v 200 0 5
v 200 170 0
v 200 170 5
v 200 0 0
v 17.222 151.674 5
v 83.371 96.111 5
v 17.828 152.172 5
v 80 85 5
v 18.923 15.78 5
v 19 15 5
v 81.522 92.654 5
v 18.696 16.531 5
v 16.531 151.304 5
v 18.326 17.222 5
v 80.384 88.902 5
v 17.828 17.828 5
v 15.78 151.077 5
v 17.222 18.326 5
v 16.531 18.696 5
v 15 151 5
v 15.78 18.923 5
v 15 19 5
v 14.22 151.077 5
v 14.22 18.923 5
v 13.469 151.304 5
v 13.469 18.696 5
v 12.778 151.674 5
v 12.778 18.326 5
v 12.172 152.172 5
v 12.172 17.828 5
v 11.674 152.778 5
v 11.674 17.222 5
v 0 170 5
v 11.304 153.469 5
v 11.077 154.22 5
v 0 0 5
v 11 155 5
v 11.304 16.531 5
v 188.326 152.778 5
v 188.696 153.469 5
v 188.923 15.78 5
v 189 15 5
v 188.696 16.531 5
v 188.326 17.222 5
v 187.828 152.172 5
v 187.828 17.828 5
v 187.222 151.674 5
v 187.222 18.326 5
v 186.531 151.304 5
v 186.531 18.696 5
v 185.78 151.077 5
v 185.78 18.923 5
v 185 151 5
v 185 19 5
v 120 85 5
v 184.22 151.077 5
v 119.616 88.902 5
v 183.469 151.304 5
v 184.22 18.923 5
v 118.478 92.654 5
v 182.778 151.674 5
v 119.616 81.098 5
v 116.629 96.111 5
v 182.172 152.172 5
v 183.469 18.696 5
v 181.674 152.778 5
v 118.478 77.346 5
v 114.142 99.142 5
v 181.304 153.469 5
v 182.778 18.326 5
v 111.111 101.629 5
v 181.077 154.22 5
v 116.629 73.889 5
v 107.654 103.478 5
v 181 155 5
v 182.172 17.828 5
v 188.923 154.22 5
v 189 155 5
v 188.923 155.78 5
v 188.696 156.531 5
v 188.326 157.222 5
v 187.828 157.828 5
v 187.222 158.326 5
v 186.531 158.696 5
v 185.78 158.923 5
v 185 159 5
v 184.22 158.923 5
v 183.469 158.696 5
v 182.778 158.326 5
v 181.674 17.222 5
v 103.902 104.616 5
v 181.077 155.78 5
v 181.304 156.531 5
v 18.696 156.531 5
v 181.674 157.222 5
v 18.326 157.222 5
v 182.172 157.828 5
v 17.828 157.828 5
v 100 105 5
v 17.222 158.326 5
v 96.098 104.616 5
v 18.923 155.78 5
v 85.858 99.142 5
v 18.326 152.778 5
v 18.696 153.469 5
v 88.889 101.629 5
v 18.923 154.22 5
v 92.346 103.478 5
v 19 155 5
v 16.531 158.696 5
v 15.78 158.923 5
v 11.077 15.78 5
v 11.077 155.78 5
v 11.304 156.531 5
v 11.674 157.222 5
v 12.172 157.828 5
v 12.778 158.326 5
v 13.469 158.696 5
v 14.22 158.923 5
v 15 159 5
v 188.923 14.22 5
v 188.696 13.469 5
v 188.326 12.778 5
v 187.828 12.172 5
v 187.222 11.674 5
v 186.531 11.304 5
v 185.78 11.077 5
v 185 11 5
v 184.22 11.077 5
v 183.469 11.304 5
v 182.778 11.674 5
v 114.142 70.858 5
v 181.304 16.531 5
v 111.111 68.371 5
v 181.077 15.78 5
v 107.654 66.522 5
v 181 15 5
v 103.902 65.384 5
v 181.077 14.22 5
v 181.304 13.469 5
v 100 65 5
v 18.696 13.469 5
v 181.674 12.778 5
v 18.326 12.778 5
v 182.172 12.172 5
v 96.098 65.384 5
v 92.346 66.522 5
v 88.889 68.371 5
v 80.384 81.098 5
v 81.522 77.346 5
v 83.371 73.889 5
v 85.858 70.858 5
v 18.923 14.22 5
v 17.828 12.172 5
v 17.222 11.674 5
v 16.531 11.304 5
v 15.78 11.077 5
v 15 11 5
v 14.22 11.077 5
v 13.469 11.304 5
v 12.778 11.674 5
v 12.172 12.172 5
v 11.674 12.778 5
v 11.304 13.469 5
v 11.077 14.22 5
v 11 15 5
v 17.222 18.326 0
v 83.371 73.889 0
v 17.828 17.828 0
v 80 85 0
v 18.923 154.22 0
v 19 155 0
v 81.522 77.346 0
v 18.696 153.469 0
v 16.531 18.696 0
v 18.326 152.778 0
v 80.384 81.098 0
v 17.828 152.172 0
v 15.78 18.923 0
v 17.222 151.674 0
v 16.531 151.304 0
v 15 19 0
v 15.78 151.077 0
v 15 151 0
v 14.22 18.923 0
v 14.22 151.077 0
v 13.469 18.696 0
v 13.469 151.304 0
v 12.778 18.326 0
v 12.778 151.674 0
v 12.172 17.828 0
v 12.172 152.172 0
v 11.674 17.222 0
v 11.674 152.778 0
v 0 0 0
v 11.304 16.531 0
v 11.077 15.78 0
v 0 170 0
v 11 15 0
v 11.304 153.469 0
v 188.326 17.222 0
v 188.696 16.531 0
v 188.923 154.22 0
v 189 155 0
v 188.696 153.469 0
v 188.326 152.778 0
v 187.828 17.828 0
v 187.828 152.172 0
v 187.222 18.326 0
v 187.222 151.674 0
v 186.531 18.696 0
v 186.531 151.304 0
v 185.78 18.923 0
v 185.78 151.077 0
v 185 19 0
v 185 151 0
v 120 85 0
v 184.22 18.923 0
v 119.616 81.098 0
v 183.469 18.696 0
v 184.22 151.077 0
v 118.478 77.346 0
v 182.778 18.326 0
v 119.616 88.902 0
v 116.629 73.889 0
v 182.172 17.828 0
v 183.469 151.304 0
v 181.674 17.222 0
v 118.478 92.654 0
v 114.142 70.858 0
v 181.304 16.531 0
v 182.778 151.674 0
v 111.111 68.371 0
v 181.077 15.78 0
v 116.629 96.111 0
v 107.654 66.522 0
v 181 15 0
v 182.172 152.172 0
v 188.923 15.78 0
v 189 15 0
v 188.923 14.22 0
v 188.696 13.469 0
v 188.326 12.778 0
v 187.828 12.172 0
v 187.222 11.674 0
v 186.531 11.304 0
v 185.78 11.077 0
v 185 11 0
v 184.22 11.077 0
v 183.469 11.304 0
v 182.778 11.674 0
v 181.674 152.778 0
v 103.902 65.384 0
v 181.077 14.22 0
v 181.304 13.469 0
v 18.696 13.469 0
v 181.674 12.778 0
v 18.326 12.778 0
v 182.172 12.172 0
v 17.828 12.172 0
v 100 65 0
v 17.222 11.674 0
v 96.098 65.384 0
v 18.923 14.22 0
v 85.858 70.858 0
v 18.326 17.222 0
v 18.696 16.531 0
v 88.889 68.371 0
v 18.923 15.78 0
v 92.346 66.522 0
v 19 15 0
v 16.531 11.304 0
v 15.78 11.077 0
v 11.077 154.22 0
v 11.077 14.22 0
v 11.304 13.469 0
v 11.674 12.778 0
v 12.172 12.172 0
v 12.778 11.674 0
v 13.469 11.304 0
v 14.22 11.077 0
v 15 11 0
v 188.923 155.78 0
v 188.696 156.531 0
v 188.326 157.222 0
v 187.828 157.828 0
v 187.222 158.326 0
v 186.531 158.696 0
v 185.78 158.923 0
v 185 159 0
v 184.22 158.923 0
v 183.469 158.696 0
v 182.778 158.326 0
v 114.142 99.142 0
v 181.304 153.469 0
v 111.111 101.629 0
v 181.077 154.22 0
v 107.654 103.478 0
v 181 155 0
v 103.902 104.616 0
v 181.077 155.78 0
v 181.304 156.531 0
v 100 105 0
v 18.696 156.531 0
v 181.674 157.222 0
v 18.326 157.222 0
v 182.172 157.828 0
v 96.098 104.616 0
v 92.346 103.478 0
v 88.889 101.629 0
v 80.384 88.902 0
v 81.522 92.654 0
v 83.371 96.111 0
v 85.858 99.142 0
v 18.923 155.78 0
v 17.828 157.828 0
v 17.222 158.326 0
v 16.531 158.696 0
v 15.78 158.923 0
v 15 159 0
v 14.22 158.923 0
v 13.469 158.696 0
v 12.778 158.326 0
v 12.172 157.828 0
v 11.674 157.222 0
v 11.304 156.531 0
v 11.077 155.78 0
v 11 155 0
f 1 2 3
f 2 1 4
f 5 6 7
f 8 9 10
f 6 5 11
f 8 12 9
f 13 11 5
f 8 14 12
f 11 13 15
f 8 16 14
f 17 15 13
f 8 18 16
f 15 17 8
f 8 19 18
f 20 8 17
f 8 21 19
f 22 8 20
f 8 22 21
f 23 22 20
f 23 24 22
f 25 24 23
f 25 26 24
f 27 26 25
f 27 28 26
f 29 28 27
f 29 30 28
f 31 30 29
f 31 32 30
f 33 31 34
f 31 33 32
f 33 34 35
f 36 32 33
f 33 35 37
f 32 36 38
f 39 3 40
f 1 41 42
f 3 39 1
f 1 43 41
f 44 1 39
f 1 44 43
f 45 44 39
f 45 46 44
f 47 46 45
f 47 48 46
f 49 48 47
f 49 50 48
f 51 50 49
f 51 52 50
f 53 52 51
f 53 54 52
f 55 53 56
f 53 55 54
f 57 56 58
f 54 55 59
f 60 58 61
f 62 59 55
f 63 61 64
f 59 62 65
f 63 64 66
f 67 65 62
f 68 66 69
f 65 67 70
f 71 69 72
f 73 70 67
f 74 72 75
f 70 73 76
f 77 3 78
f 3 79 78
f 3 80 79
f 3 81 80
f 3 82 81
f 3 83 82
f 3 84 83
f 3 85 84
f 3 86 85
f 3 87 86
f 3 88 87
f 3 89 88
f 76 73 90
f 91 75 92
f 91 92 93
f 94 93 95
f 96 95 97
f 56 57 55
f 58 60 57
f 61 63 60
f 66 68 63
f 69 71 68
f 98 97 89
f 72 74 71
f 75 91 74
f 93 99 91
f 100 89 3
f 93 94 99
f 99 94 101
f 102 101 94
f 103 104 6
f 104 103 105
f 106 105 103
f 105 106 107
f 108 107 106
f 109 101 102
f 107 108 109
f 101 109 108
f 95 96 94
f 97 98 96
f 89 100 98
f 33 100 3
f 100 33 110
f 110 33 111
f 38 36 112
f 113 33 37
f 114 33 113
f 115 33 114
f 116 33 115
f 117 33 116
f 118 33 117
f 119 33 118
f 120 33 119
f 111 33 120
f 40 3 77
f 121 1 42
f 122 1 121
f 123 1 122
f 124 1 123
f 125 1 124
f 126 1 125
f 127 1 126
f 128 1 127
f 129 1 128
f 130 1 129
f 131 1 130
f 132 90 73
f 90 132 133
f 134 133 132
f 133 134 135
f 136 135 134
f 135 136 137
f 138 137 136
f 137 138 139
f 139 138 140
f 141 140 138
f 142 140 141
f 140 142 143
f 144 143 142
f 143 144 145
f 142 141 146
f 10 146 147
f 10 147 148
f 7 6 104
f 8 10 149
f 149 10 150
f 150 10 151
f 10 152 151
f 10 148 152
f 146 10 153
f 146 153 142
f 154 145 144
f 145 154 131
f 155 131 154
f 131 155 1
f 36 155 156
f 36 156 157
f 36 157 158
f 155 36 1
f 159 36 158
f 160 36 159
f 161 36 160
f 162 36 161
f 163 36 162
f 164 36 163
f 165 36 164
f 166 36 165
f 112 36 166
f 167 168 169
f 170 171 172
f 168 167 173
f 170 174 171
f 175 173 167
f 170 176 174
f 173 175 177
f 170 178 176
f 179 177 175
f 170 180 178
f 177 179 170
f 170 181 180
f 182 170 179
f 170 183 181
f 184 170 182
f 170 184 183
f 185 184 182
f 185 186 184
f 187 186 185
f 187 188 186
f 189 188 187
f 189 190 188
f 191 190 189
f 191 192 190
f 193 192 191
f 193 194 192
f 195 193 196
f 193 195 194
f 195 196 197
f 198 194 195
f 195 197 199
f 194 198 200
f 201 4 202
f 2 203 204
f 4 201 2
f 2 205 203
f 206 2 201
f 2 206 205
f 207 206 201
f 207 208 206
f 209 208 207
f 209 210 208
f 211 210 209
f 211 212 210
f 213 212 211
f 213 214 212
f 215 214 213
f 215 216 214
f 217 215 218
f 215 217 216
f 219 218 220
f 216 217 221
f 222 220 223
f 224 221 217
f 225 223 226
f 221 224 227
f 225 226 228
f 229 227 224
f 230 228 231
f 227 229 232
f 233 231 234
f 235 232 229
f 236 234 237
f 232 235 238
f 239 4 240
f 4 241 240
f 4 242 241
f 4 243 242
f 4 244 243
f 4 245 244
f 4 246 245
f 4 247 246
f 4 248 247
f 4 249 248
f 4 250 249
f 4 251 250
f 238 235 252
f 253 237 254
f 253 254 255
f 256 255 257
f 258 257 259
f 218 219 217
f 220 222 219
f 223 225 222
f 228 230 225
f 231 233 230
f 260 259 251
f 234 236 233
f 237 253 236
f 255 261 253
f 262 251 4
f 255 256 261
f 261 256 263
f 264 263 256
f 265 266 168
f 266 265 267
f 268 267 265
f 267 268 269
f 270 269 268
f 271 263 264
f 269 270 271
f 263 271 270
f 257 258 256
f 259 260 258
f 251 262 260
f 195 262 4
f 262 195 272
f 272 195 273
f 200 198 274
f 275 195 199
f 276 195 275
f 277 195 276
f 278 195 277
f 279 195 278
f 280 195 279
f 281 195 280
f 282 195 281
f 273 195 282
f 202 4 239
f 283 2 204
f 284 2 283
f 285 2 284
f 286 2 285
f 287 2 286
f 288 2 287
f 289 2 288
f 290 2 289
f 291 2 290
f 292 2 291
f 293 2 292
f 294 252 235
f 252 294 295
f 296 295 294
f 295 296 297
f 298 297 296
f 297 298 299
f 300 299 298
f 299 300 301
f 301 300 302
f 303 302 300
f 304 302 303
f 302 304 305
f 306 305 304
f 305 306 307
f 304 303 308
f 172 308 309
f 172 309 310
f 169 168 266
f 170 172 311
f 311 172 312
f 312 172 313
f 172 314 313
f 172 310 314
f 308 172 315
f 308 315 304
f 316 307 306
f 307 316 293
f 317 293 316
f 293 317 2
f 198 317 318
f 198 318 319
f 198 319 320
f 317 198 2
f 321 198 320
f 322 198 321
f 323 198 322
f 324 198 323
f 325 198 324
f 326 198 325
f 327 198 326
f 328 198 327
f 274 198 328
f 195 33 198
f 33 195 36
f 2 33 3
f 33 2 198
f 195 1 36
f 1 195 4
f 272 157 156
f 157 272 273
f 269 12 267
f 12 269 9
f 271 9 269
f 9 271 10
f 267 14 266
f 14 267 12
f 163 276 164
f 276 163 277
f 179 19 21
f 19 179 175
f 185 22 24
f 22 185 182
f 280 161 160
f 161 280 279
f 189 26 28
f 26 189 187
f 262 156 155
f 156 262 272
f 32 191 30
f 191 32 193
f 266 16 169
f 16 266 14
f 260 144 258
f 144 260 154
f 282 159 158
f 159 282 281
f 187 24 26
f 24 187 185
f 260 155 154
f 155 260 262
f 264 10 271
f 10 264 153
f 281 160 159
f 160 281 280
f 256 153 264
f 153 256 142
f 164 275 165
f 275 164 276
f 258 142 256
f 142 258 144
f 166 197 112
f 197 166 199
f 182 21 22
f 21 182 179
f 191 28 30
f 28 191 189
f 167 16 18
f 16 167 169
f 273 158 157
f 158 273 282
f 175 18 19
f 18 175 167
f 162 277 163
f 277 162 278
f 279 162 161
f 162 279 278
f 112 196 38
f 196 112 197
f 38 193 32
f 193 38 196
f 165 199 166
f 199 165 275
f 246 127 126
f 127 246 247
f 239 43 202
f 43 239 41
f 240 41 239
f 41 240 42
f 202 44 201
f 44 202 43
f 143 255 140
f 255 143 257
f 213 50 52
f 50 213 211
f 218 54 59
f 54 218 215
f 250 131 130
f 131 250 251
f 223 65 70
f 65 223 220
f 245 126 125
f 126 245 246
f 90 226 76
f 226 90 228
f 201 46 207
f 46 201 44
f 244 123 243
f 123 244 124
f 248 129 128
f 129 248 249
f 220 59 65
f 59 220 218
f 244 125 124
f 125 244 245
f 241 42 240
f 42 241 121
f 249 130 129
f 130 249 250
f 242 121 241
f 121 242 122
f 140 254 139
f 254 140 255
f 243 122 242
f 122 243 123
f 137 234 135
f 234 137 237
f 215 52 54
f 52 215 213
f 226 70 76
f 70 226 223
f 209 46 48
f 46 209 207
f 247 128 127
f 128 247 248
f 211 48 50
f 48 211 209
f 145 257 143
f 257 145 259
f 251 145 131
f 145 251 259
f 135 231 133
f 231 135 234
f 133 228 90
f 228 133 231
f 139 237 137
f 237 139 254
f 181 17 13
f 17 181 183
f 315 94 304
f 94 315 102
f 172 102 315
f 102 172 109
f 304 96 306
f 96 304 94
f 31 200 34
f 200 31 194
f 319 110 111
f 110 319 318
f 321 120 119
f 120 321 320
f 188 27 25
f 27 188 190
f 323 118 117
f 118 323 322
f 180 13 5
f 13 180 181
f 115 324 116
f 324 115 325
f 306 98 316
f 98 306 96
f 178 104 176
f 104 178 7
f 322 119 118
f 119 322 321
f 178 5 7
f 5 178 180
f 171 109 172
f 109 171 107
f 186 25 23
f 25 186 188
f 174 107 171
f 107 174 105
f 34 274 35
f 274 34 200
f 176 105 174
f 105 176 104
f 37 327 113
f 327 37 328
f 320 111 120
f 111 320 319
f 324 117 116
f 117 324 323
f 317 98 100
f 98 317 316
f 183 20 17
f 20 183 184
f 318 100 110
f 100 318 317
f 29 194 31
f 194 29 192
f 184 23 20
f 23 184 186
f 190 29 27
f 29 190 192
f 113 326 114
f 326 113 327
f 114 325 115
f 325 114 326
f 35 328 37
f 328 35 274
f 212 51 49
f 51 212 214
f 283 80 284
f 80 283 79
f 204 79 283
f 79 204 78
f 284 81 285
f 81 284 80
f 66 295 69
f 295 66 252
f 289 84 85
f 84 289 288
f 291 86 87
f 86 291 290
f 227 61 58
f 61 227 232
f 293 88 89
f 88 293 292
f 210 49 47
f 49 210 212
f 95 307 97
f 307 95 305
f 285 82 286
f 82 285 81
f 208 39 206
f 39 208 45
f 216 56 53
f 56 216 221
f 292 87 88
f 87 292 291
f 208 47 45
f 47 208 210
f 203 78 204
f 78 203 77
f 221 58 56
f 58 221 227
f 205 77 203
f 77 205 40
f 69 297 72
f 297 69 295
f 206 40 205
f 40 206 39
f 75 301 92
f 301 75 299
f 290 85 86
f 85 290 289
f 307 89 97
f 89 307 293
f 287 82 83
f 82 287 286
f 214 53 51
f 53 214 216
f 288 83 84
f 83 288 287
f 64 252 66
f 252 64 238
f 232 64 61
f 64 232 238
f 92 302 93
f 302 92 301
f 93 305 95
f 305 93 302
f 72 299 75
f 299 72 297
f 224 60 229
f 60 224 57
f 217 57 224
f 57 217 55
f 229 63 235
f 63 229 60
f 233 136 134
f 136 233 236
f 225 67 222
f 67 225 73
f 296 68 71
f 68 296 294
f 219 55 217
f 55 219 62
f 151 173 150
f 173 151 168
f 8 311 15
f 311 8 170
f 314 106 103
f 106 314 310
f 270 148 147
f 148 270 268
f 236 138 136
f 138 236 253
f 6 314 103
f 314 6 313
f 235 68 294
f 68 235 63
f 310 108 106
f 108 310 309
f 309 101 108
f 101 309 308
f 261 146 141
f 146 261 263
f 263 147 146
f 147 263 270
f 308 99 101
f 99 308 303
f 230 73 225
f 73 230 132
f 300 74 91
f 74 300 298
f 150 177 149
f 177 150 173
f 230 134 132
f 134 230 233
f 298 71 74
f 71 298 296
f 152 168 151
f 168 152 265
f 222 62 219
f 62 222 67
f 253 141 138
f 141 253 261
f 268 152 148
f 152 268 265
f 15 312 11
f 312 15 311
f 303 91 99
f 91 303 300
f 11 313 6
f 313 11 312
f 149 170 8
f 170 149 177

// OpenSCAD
$fn = 32;

// ----------------------------------------------------------------------
// Big plate: 200-250 mm adapter plate
// ----------------------------------------------------------------------

// --- parameters (mm) ---
plate_l = 200;            // plate length, X
plate_w = 170;            // plate width, Y
plate_t = 5;              // plate thickness, Z
corner_d = 8;             // corner hole diameter
corner_in = 15;           // corner hole inset from the edges
bore_d = 40;              // central bore

difference() {
  cube([plate_l, plate_w, plate_t]);
  translate([corner_in, corner_in, -1]) cylinder(h = plate_t + 2, d = corner_d);
  translate([plate_l - corner_in, corner_in, -1]) cylinder(h = plate_t + 2, d = corner_d);
  translate([corner_in, plate_w - corner_in, -1]) cylinder(h = plate_t + 2, d = corner_d);
  translate([plate_l - corner_in, plate_w - corner_in, -1]) cylinder(h = plate_t + 2, d = corner_d);
  translate([plate_l / 2, plate_w / 2, -1]) cylinder(h = plate_t + 2, d = bore_d);
}
